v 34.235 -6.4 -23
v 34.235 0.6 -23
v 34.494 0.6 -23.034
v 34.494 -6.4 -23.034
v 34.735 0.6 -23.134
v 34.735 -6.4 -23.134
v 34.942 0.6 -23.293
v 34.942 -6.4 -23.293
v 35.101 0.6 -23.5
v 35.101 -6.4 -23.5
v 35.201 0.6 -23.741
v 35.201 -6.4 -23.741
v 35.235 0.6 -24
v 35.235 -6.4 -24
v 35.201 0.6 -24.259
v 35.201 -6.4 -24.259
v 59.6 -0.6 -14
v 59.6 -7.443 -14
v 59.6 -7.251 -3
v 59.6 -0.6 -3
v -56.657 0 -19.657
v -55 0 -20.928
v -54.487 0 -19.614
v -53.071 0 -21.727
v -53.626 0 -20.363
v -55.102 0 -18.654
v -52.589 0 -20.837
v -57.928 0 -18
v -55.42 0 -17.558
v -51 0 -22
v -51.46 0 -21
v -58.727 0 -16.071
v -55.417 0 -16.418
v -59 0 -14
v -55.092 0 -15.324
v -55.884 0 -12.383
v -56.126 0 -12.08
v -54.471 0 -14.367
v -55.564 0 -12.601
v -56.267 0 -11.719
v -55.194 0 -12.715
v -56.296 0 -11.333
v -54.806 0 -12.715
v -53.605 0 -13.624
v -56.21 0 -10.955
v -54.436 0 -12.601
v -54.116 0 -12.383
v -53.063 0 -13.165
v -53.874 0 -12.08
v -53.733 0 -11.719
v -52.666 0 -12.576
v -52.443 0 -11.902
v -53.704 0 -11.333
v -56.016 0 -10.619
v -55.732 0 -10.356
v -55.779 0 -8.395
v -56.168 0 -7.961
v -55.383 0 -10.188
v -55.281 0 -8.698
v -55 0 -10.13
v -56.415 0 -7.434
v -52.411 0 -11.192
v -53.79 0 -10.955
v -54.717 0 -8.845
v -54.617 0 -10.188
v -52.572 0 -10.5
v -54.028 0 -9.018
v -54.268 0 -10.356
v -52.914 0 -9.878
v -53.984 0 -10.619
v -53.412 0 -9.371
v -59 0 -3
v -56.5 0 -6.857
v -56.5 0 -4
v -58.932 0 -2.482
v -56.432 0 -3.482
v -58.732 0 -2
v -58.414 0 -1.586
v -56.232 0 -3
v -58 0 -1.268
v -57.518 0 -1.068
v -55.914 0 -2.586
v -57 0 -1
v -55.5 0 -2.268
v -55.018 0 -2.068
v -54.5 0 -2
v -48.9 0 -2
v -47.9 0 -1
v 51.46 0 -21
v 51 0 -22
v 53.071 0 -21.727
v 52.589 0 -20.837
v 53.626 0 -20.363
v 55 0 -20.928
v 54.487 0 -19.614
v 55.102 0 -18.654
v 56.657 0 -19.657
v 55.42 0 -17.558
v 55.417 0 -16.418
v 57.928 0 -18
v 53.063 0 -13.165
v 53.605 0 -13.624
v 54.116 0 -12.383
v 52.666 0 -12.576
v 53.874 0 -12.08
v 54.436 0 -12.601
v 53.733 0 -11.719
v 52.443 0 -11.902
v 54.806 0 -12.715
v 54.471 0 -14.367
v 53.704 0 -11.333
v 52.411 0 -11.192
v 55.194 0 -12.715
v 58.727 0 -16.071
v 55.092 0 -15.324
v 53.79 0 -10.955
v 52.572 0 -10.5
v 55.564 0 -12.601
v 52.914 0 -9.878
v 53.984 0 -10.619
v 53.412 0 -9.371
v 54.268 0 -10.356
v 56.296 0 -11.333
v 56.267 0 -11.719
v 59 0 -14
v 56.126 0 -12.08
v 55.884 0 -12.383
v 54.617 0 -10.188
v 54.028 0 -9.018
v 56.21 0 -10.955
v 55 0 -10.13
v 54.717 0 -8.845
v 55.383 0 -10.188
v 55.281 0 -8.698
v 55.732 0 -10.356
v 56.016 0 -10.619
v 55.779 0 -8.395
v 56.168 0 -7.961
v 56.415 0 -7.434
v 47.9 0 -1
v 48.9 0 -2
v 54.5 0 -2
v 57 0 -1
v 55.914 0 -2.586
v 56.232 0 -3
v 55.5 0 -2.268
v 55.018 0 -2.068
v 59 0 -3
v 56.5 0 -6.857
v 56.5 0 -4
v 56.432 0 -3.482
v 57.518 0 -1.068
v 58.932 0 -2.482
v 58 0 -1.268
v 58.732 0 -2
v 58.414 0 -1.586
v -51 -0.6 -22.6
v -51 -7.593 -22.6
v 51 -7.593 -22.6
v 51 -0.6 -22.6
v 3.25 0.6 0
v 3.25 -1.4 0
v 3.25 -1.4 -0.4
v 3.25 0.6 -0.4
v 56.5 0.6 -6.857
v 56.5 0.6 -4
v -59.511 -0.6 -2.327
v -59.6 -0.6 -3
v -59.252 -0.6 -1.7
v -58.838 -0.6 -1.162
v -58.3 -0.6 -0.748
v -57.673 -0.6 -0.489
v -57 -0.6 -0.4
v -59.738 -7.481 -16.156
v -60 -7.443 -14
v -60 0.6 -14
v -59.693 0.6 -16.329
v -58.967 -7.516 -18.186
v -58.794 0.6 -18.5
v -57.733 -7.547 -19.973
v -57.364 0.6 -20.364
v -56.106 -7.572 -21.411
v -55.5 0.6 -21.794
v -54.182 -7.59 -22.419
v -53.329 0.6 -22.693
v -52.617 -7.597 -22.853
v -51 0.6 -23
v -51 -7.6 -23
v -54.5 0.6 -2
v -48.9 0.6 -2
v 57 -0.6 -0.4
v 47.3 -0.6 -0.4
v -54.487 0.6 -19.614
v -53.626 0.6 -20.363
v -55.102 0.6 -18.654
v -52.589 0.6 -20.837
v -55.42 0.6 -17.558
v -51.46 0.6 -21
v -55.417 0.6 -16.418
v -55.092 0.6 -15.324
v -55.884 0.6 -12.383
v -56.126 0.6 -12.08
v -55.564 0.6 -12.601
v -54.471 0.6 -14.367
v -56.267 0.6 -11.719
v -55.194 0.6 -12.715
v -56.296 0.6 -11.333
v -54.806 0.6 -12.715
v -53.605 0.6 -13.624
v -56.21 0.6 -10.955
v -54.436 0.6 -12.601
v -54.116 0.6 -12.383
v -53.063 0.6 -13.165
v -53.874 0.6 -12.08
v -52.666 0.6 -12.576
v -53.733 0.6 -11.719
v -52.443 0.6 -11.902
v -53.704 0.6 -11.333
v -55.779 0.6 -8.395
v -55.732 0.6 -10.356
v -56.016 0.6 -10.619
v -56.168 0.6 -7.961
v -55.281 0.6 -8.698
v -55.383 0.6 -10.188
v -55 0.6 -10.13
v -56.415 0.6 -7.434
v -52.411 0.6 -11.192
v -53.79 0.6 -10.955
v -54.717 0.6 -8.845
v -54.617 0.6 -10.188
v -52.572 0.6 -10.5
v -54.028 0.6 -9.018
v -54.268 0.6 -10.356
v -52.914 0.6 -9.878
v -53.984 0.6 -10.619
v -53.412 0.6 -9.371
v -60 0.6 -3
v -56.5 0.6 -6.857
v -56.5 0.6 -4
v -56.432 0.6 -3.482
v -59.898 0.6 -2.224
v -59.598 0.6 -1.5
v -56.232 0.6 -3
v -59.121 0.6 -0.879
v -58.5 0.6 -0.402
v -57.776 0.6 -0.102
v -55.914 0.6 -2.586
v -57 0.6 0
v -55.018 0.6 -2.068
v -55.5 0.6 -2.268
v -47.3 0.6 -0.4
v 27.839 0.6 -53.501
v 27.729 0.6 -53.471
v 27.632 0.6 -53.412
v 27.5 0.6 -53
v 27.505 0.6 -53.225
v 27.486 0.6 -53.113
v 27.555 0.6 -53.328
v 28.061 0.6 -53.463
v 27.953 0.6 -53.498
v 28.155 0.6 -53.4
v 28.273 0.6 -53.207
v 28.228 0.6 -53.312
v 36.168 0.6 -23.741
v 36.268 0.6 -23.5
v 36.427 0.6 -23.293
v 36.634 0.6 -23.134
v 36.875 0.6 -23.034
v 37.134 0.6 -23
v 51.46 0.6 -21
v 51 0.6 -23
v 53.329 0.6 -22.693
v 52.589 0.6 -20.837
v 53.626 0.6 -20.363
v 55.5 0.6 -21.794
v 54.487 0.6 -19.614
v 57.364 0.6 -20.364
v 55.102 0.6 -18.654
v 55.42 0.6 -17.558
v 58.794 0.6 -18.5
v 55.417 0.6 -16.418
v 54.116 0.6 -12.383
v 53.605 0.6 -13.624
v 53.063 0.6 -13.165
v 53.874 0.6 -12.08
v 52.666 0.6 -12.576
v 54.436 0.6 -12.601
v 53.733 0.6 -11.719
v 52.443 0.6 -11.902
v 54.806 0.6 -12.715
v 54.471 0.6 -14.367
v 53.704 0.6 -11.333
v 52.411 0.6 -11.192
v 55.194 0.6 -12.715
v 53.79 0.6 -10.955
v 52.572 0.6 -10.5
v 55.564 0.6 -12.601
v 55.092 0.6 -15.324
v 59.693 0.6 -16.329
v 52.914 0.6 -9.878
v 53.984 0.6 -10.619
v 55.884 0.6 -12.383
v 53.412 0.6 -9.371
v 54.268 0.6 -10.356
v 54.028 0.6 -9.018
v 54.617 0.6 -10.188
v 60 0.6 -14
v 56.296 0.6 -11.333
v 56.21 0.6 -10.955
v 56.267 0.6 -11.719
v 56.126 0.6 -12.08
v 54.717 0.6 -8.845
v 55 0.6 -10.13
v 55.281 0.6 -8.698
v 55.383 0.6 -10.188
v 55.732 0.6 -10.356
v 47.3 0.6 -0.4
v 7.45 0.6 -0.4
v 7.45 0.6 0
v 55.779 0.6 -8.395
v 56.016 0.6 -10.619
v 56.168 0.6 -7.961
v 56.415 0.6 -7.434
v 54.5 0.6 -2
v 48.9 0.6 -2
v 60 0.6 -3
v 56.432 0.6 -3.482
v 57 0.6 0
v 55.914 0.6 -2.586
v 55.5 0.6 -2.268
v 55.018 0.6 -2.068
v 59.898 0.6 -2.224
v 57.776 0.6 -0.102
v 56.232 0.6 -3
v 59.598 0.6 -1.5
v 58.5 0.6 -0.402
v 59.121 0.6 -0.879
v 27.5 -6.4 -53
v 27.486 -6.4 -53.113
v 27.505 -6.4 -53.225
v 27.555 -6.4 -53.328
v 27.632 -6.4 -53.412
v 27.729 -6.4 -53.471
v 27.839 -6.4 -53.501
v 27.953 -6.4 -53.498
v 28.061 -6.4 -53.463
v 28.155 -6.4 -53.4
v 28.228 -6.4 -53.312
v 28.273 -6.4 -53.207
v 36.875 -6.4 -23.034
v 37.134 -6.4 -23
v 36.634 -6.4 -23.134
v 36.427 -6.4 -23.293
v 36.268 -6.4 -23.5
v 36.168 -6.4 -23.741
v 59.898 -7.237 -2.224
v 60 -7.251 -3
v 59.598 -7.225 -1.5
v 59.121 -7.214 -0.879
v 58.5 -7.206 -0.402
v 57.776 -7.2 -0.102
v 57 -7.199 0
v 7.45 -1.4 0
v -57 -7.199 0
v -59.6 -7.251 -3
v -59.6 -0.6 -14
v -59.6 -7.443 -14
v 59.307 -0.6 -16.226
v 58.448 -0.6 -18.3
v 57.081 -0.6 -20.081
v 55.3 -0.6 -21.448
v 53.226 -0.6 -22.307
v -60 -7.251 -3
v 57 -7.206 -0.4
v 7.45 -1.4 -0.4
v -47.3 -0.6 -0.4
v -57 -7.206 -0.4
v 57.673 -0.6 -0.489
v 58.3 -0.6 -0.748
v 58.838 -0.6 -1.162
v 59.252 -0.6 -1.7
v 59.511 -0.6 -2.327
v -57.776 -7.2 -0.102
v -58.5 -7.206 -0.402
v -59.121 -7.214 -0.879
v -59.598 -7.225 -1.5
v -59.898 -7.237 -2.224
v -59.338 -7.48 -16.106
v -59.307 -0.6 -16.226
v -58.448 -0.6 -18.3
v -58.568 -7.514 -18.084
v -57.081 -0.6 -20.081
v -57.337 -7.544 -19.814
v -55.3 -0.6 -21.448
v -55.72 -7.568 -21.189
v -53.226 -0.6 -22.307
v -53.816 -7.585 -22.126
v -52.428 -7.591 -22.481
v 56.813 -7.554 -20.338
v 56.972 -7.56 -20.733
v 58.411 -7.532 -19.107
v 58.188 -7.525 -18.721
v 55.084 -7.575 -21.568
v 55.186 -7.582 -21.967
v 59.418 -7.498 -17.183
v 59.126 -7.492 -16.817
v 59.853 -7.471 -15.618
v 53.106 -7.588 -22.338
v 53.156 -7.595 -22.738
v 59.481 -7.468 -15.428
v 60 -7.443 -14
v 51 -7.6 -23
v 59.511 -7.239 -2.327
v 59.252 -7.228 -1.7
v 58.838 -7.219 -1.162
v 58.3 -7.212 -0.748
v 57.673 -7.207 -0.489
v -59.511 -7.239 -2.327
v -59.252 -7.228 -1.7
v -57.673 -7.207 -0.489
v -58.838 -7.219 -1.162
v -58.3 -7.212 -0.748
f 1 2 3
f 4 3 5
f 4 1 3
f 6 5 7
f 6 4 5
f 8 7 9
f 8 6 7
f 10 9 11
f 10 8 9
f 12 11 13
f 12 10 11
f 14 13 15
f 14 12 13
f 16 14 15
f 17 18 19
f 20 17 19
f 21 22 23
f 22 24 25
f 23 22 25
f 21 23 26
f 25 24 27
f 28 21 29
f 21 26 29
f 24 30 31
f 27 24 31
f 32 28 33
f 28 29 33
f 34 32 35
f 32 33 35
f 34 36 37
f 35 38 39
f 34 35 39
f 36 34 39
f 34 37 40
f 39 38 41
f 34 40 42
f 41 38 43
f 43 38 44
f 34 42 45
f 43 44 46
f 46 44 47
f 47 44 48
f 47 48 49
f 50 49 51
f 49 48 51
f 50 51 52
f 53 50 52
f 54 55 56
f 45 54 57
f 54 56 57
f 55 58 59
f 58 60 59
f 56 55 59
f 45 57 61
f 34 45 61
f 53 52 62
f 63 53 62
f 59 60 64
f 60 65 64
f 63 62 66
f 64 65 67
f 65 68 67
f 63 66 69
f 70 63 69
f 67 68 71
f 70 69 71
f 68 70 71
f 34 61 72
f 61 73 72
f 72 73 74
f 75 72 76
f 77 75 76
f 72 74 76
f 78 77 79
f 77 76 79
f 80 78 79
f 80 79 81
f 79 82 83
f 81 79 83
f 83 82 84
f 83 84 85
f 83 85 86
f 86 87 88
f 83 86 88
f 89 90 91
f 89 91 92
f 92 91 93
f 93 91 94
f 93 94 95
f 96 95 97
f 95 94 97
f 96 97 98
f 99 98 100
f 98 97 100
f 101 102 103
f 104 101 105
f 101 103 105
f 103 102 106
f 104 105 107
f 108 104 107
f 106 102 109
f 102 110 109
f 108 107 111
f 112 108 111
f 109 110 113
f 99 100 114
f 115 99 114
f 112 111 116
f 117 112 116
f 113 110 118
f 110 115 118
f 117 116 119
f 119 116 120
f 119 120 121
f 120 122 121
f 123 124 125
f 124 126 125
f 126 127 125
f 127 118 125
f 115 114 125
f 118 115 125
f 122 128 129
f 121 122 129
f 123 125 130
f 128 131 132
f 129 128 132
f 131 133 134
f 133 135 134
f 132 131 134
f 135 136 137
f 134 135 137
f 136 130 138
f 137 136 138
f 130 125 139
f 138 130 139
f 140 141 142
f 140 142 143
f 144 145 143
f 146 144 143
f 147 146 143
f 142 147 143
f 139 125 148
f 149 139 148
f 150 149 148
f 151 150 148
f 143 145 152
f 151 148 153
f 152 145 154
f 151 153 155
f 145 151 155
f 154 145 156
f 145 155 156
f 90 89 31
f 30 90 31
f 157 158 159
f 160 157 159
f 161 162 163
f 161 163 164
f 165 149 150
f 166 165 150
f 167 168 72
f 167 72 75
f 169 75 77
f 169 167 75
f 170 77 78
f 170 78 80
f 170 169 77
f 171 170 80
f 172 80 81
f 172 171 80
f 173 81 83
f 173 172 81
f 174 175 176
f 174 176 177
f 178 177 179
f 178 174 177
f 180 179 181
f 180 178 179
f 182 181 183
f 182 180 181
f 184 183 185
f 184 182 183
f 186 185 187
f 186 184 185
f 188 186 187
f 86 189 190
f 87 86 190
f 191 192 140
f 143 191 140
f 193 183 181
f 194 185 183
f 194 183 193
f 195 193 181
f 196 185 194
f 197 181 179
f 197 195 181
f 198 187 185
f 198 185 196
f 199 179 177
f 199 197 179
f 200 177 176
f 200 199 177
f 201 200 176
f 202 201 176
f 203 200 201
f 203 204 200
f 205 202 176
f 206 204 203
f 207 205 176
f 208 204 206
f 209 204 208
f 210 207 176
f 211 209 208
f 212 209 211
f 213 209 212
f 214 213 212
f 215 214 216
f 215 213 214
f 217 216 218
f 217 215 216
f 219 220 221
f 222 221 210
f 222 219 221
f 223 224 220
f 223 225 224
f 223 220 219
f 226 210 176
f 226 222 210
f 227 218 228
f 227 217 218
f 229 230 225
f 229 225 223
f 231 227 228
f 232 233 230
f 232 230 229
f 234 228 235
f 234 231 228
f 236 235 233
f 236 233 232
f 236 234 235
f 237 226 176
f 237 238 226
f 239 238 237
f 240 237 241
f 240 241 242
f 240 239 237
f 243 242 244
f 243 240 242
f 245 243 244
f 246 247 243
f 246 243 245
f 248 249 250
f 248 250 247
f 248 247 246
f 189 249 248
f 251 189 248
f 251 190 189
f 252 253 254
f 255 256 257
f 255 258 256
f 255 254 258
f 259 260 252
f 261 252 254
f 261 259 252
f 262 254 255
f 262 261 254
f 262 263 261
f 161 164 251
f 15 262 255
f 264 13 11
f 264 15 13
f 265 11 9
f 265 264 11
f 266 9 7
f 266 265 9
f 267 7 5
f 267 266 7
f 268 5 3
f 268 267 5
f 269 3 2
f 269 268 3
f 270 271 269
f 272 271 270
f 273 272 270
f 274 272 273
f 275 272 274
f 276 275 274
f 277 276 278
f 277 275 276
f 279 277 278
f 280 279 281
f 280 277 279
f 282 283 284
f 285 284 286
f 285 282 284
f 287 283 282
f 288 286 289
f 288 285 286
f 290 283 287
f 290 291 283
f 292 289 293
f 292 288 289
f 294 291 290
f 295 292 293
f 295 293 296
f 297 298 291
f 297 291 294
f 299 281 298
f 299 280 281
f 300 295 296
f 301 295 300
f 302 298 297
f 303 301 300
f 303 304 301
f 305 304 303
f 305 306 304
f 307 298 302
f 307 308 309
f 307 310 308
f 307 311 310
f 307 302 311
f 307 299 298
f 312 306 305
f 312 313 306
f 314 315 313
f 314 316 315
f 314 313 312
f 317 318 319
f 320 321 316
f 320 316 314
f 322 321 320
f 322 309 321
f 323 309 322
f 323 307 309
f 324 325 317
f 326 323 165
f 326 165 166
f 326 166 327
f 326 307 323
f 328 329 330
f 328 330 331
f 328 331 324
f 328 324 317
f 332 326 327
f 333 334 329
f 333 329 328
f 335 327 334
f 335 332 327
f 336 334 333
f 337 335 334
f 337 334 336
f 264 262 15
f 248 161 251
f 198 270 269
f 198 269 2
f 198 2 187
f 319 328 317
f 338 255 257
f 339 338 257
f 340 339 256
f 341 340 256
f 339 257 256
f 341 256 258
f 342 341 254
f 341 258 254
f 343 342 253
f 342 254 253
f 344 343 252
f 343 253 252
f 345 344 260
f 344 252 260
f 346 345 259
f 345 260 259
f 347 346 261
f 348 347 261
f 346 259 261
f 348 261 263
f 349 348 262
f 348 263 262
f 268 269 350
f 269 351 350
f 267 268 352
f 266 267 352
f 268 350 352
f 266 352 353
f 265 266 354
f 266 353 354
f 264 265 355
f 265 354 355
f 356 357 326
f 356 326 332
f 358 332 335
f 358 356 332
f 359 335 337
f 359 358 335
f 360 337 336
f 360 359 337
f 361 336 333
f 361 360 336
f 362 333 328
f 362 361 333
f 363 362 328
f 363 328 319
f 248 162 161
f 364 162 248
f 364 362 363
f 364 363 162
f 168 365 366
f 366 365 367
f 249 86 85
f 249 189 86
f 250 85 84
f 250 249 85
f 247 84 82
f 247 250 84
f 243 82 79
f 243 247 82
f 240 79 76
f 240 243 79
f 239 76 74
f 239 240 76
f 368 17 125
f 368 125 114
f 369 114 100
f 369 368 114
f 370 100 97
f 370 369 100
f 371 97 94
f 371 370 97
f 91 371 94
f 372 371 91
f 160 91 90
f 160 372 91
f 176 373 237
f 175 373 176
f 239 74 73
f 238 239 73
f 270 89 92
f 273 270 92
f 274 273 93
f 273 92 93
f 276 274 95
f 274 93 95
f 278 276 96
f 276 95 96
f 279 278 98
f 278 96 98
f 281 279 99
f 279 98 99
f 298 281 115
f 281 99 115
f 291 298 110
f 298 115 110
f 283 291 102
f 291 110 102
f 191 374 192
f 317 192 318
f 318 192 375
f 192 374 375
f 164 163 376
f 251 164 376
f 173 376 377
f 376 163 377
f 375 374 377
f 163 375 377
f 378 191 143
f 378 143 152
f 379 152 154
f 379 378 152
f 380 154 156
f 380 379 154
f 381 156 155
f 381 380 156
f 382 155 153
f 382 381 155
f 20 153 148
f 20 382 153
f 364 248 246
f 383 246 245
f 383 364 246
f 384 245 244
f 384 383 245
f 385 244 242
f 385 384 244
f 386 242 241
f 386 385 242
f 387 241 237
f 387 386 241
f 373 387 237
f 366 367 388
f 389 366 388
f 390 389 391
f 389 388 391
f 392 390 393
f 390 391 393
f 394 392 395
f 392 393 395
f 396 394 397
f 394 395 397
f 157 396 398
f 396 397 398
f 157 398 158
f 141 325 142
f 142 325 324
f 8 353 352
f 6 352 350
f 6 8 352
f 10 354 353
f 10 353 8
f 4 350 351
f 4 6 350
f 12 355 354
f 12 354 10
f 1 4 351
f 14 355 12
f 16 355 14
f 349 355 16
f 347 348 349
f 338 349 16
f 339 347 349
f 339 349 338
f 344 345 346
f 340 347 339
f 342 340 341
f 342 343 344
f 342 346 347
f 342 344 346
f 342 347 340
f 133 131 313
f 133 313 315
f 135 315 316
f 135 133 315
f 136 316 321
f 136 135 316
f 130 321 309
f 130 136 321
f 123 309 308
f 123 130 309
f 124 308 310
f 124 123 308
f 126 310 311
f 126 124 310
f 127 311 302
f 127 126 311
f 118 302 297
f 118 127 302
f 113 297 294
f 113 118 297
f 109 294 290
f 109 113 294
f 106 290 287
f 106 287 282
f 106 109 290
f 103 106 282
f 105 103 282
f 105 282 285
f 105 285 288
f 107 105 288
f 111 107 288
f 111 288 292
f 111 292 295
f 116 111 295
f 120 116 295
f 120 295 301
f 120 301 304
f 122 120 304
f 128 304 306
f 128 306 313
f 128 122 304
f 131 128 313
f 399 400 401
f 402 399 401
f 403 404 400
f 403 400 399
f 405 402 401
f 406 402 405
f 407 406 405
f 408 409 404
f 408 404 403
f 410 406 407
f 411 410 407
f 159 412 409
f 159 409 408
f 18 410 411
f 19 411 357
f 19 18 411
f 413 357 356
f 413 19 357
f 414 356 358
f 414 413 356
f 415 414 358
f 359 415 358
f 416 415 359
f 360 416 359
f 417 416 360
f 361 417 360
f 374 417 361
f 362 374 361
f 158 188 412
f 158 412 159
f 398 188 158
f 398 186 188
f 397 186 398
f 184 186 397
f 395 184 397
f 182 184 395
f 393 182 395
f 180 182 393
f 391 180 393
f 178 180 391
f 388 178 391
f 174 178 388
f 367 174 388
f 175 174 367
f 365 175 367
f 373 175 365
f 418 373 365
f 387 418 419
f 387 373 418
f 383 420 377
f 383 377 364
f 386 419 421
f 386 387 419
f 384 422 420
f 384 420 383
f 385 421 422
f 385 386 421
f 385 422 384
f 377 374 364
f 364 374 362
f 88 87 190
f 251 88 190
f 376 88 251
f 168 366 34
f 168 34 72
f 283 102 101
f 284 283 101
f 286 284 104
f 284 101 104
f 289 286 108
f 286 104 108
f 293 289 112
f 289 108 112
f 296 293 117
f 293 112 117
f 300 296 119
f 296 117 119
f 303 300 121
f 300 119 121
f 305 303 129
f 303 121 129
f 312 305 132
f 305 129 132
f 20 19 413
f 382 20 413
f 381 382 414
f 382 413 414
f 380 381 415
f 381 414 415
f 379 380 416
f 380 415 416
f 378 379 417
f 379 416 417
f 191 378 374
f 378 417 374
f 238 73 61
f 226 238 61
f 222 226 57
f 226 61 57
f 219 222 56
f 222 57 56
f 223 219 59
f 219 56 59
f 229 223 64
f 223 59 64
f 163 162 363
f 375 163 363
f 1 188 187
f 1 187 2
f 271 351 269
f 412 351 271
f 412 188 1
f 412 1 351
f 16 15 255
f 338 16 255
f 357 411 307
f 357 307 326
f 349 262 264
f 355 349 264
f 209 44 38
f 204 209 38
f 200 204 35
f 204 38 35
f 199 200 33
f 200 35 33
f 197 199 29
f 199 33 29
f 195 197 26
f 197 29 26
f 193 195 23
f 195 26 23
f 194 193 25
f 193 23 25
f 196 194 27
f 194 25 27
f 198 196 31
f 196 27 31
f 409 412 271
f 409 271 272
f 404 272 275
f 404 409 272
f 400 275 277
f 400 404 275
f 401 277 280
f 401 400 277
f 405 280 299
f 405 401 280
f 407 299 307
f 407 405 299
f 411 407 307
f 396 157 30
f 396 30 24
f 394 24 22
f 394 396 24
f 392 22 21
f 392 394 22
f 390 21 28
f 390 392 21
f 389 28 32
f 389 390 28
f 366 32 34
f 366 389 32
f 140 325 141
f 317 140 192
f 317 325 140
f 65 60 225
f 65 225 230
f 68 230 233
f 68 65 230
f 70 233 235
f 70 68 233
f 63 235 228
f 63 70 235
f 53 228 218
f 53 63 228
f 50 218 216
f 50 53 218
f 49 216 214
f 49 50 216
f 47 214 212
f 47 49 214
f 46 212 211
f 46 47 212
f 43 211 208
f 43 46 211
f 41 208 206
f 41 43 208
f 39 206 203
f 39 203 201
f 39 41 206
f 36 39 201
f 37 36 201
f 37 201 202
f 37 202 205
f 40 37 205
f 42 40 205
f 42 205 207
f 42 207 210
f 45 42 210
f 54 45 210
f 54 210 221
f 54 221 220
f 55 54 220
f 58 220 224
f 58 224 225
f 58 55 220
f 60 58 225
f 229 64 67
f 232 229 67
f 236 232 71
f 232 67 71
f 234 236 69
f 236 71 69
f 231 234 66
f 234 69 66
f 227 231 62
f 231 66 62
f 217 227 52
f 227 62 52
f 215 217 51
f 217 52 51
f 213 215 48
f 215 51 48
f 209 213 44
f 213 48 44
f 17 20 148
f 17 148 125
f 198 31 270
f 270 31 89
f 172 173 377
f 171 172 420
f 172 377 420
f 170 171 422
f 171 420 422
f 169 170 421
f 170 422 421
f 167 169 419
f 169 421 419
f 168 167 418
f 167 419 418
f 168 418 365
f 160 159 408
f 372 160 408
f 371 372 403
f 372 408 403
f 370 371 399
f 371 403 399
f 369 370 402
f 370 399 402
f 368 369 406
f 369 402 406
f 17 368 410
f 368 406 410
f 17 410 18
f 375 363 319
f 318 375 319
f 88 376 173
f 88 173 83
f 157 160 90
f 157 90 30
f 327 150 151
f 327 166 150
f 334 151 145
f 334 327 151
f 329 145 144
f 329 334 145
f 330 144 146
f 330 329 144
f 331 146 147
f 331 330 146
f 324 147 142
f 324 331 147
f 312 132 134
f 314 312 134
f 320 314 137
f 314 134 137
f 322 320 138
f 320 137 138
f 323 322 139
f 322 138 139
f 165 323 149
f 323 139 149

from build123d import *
from build123d.topology import SkipClean

# Parameters (mm, degrees)
SKETCH1_R               = 1.3
BOSS_EXTRUDE1_DEPTH     = 0.6
BOSS_EXTRUDE2_START     = 7.6
BOSS_EXTRUDE2_DEPTH     = 8.2
CHAMFER1_SIZE           = 0.6
CUT_EXTRUDE1_DEPTH      = 65.705177536
CUT_EXTRUDE1_DEPTH_BACK = 65.705177536
CUT_EXTRUDE2_REACH      = 66.705
SKETCH11_W              = 4.2
SKETCH11_H              = 2
FILLET1_R               = 2
CHAMFER2_SIZE           = 1.7
BOSS_EXTRUDE3_START     = 0.6
BOSS_EXTRUDE3_DEPTH     = 7
FILLET2_R               = 1


with BuildPart() as part:
    # Sketch1 → Boss-Extrude1 (new body)
    with BuildSketch(Plane(origin=(0, 0, 0), x_dir=(1, 0, 0), z_dir=(0, 1, 0))):
        with BuildLine():
            Line((-57, 0), (-56.5, 0))
            Line((-56.5, 0), (56.5, 0))
            Line((56.5, 0), (57, 0))
            ThreePointArc((57, 0), (59.121320344, 0.878679656), (60, 3))
            Line((60, 3), (60, 14))
            ThreePointArc((60, 14), (57.363961031, 20.363961031), (51, 23))
            Line((51, 23), (-51, 23))
            ThreePointArc((-51, 23), (-57.363961031, 20.363961031), (-60, 14))
            Line((-60, 14), (-60, 3))
            ThreePointArc((-60, 3), (-59.121320344, 0.878679656), (-57, 0))
        make_face()
        with Locations(Location((55, 11.43, 0), (0, 0, 270))):
            Circle(SKETCH1_R, mode=Mode.SUBTRACT)
        with Locations(Location((-55, 11.43, 0), (0, 0, 270))):
            Circle(SKETCH1_R, mode=Mode.SUBTRACT)
        with BuildLine():
            Line((-51.459505684, 21), (51.459505684, 21))
            ThreePointArc((51.459505684, 21), (55.300275809, 18.117356187), (53.605259815, 13.624242424))
            ThreePointArc((53.605259815, 13.624242424), (52.467669637, 10.840675867), (54.717391304, 8.845404804))
            ThreePointArc((54.717391304, 8.845404804), (55.989090764, 8.192398352), (56.5, 6.857254654))
            Line((56.5, 6.857254654), (56.5, 2))
            Line((56.5, 2), (49, 2))
            Line((49, 2), (49, 0.4))
            Line((49, 0.4), (-49, 0.4))
            Line((-49, 0.4), (-49, 2))
            Line((-49, 2), (-56.5, 2))
            Line((-56.5, 2), (-56.5, 6.857254654))
            ThreePointArc((-56.5, 6.857254654), (-55.989090764, 8.192398352), (-54.717391304, 8.845404804))
            ThreePointArc((-54.717391304, 8.845404804), (-52.467669637, 10.840675867), (-53.605259815, 13.624242424))
            ThreePointArc((-53.605259815, 13.624242424), (-55.300275809, 18.117356187), (-51.459505684, 21))
        make_face(mode=Mode.SUBTRACT)
    extrude(amount=BOSS_EXTRUDE1_DEPTH)

    # Sketch8 → Boss-Extrude2 (add)
    with SkipClean():  # the faces are left unmerged after this step: merging them gives an invalid solid
        with BuildSketch(Plane(origin=(0, 0, 0), x_dir=(-1, 0, 0), z_dir=(0, -1, 0)).offset(BOSS_EXTRUDE2_START)):
            with BuildLine():
                Line((-57, 0), (57, 0))
                ThreePointArc((57, 0), (59.121320344, 0.878679656), (60, 3))
                Line((60, 3), (60, 14))
                ThreePointArc((60, 14), (57.363961031, 20.363961031), (51, 23))
                Line((51, 23), (-51, 23))
                ThreePointArc((-51, 23), (-57.363961031, 20.363961031), (-60, 14))
                Line((-60, 14), (-60, 3))
                ThreePointArc((-60, 3), (-59.121320344, 0.878679656), (-57, 0))
            make_face()
            with BuildLine():
                Line((51, 22.6), (-51, 22.6))
                ThreePointArc((-51, 22.6), (-57.081118318, 20.081118318), (-59.6, 14))
                Line((-59.6, 14), (-59.6, 3))
                ThreePointArc((-59.6, 3), (-58.838477631, 1.161522369), (-57, 0.4))
                Line((-57, 0.4), (57, 0.4))
                ThreePointArc((57, 0.4), (58.838477631, 1.161522369), (59.6, 3))
                Line((59.6, 3), (59.6, 14))
                ThreePointArc((59.6, 14), (57.081118318, 20.081118318), (51, 22.6))
            make_face(mode=Mode.SUBTRACT)
        extrude(amount=-BOSS_EXTRUDE2_DEPTH)
    add(part.part.scale(1), mode=Mode.REPLACE)  # the faces are merged on a copy

    # Chamfer1
    chamfer1_edges = [part.edges().sort_by_distance(p)[0] for p in [
        (-53, 0, -0.4),
        (53, 0, -0.4),
        (-58.838477631, 0, -1.161522369),
        (-59.6, 0, -8.5),
        (-57.081118318, 0, -20.081118318),
        (0, 0, -22.6),
        (57.081118318, 0, -20.081118318),
        (59.6, 0, -8.5),
        (58.838477631, 0, -1.161522369),
    ]]
    chamfer(chamfer1_edges, length=CHAMFER1_SIZE)

    # Sketch9 → Cut-Extrude1 (cut, two sides: drawn at the far end of the back side and taken through both)
    with BuildSketch(Plane(origin=(0, 0, 0), x_dir=(0, 0, -1), z_dir=(1, 0, 0)).offset(-CUT_EXTRUDE1_DEPTH_BACK)):
        Polygon((-2, -7.6), (23, -7.6), (-2, -7.163623377), align=None)
    extrude(amount=CUT_EXTRUDE1_DEPTH + CUT_EXTRUDE1_DEPTH_BACK, mode=Mode.SUBTRACT)

    # Sketch11 → Cut-Extrude2 (cut, up to next)
    with BuildSketch(Plane.XY, mode=Mode.PRIVATE) as cut_extrude2_sk1:
        with Locations((5.35, -0.4)):
            Rectangle(SKETCH11_W, SKETCH11_H)
    cut_extrude2_tool1 = extrude(cut_extrude2_sk1.sketch, amount=-CUT_EXTRUDE2_REACH, mode=Mode.PRIVATE) & part.part
    add(cut_extrude2_tool1.solids().sort_by_distance((5.35, -0.4, 0))[0], mode=Mode.SUBTRACT)

    # Fillet1
    fillet1_edges = [part.edges().sort_by_distance(p)[0] for p in [
        (-56.5, 0.3, -2),
        (56.5, 0.3, -2),
    ]]
    fillet(fillet1_edges, radius=FILLET1_R)

    # Chamfer2
    # the kernel refuses this chamfer: 1.7 mm, written as the material it adds along each edge
    with BuildSketch(Plane(origin=(-49, -4.97186108, -0.4), x_dir=(-0.02749587661058786, 0, -0.9996219169112968), z_dir=(0, 1, 0))) as chamfer2_piece_1_section:
        Polygon((CHAMFER2_SIZE * 0.999621916911, -CHAMFER2_SIZE * 0.0274958766106), (-CHAMFER2_SIZE * 0.0274958766106, -CHAMFER2_SIZE * 0.999621916911), (0, 0), align=None)
    chamfer2_piece_1 = extrude(amount=5.57186108, mode=Mode.PRIVATE)
    chamfer2_piece_1 = split(chamfer2_piece_1, bisect_by=Plane(origin=(-48.243333333, -0.31, -0.69), z_dir=(0, 0.7071067811865475, 0.7071067811865476)), keep=Keep.TOP, mode=Mode.PRIVATE)
    add(chamfer2_piece_1)
    with BuildSketch(Plane(origin=(-49, -4.97186108, -0.4), x_dir=(-0.02749587661058786, 0, -0.9996219169112968), z_dir=(0, 1, 0))) as chamfer2_piece_2_section:
        Polygon((CHAMFER2_SIZE * 0.999621916911, -CHAMFER2_SIZE * 0.0274958766106), (-CHAMFER2_SIZE * 0.0274958766106, -CHAMFER2_SIZE * 0.999621916911), (0, 0), align=None)
    chamfer2_piece_2 = extrude(amount=5.57186108, mode=Mode.PRIVATE)
    chamfer2_piece_2 = split(chamfer2_piece_2, bisect_by=Plane(origin=(-48.705555556, 0, -1.511111111), z_dir=(0, 1, 0)), keep=Keep.TOP, mode=Mode.PRIVATE)
    chamfer2_piece_2 = split(chamfer2_piece_2, bisect_by=Plane(origin=(-48.705555556, 0.227272727, -2), z_dir=(0, 0, 1)), keep=Keep.TOP, mode=Mode.PRIVATE)
    add(chamfer2_piece_2)
    with BuildSketch(Plane(origin=(49, 0.6, -0.4), x_dir=(0.02749587661058786, 0, -0.9996219169112968), z_dir=(0, -1, 0))) as chamfer2_piece_3_section:
        Polygon((CHAMFER2_SIZE * 0.999621916911, -CHAMFER2_SIZE * 0.0274958766106), (-CHAMFER2_SIZE * 0.0274958766106, -CHAMFER2_SIZE * 0.999621916911), (0, 0), align=None)
    chamfer2_piece_3 = extrude(amount=5.57186108, mode=Mode.PRIVATE)
    chamfer2_piece_3 = split(chamfer2_piece_3, bisect_by=Plane(origin=(48.35, 0.060810811, -1.060810811), z_dir=(0, 0.7071067811865475, 0.7071067811865476)), keep=Keep.TOP, mode=Mode.PRIVATE)
    add(chamfer2_piece_3)
    with BuildSketch(Plane(origin=(49, 0.6, -0.4), x_dir=(0.02749587661058786, 0, -0.9996219169112968), z_dir=(0, -1, 0))) as chamfer2_piece_4_section:
        Polygon((CHAMFER2_SIZE * 0.999621916911, -CHAMFER2_SIZE * 0.0274958766106), (-CHAMFER2_SIZE * 0.0274958766106, -CHAMFER2_SIZE * 0.999621916911), (0, 0), align=None)
    chamfer2_piece_4 = extrude(amount=5.57186108, mode=Mode.PRIVATE)
    chamfer2_piece_4 = split(chamfer2_piece_4, bisect_by=Plane(origin=(48.705555556, 0, -1.511111111), z_dir=(0, 1, 0)), keep=Keep.TOP, mode=Mode.PRIVATE)
    chamfer2_piece_4 = split(chamfer2_piece_4, bisect_by=Plane(origin=(48.705555556, 0.227272727, -2), z_dir=(0, 0, 1)), keep=Keep.TOP, mode=Mode.PRIVATE)
    add(chamfer2_piece_4)

    # Sketch12 → Boss-Extrude3 (add)
    with BuildSketch(Plane(origin=(0, 0, 0), x_dir=(1, 0, 0), z_dir=(0, 1, 0)).offset(BOSS_EXTRUDE3_START)):
        with BuildLine():
            Line((28.272740661, 53.207055236), (36.366696717, 23))
            Line((36.366696717, 23), (35.538475773, 23))
            Line((35.538475773, 23), (27.5, 53))
            ThreePointArc((27.5, 53), (27.782842712, 53.489897949), (28.272740661, 53.207055236))
        make_face()
    extrude(amount=-BOSS_EXTRUDE3_DEPTH)

    # Fillet2
    fillet2_edges = [part.edges().sort_by_distance(p)[0] for p in [
        (36.366696717, -2.9, -23),
        (35.538475773, -2.9, -23),
    ]]
    fillet(fillet2_edges, radius=FILLET2_R)


solid = part.part
